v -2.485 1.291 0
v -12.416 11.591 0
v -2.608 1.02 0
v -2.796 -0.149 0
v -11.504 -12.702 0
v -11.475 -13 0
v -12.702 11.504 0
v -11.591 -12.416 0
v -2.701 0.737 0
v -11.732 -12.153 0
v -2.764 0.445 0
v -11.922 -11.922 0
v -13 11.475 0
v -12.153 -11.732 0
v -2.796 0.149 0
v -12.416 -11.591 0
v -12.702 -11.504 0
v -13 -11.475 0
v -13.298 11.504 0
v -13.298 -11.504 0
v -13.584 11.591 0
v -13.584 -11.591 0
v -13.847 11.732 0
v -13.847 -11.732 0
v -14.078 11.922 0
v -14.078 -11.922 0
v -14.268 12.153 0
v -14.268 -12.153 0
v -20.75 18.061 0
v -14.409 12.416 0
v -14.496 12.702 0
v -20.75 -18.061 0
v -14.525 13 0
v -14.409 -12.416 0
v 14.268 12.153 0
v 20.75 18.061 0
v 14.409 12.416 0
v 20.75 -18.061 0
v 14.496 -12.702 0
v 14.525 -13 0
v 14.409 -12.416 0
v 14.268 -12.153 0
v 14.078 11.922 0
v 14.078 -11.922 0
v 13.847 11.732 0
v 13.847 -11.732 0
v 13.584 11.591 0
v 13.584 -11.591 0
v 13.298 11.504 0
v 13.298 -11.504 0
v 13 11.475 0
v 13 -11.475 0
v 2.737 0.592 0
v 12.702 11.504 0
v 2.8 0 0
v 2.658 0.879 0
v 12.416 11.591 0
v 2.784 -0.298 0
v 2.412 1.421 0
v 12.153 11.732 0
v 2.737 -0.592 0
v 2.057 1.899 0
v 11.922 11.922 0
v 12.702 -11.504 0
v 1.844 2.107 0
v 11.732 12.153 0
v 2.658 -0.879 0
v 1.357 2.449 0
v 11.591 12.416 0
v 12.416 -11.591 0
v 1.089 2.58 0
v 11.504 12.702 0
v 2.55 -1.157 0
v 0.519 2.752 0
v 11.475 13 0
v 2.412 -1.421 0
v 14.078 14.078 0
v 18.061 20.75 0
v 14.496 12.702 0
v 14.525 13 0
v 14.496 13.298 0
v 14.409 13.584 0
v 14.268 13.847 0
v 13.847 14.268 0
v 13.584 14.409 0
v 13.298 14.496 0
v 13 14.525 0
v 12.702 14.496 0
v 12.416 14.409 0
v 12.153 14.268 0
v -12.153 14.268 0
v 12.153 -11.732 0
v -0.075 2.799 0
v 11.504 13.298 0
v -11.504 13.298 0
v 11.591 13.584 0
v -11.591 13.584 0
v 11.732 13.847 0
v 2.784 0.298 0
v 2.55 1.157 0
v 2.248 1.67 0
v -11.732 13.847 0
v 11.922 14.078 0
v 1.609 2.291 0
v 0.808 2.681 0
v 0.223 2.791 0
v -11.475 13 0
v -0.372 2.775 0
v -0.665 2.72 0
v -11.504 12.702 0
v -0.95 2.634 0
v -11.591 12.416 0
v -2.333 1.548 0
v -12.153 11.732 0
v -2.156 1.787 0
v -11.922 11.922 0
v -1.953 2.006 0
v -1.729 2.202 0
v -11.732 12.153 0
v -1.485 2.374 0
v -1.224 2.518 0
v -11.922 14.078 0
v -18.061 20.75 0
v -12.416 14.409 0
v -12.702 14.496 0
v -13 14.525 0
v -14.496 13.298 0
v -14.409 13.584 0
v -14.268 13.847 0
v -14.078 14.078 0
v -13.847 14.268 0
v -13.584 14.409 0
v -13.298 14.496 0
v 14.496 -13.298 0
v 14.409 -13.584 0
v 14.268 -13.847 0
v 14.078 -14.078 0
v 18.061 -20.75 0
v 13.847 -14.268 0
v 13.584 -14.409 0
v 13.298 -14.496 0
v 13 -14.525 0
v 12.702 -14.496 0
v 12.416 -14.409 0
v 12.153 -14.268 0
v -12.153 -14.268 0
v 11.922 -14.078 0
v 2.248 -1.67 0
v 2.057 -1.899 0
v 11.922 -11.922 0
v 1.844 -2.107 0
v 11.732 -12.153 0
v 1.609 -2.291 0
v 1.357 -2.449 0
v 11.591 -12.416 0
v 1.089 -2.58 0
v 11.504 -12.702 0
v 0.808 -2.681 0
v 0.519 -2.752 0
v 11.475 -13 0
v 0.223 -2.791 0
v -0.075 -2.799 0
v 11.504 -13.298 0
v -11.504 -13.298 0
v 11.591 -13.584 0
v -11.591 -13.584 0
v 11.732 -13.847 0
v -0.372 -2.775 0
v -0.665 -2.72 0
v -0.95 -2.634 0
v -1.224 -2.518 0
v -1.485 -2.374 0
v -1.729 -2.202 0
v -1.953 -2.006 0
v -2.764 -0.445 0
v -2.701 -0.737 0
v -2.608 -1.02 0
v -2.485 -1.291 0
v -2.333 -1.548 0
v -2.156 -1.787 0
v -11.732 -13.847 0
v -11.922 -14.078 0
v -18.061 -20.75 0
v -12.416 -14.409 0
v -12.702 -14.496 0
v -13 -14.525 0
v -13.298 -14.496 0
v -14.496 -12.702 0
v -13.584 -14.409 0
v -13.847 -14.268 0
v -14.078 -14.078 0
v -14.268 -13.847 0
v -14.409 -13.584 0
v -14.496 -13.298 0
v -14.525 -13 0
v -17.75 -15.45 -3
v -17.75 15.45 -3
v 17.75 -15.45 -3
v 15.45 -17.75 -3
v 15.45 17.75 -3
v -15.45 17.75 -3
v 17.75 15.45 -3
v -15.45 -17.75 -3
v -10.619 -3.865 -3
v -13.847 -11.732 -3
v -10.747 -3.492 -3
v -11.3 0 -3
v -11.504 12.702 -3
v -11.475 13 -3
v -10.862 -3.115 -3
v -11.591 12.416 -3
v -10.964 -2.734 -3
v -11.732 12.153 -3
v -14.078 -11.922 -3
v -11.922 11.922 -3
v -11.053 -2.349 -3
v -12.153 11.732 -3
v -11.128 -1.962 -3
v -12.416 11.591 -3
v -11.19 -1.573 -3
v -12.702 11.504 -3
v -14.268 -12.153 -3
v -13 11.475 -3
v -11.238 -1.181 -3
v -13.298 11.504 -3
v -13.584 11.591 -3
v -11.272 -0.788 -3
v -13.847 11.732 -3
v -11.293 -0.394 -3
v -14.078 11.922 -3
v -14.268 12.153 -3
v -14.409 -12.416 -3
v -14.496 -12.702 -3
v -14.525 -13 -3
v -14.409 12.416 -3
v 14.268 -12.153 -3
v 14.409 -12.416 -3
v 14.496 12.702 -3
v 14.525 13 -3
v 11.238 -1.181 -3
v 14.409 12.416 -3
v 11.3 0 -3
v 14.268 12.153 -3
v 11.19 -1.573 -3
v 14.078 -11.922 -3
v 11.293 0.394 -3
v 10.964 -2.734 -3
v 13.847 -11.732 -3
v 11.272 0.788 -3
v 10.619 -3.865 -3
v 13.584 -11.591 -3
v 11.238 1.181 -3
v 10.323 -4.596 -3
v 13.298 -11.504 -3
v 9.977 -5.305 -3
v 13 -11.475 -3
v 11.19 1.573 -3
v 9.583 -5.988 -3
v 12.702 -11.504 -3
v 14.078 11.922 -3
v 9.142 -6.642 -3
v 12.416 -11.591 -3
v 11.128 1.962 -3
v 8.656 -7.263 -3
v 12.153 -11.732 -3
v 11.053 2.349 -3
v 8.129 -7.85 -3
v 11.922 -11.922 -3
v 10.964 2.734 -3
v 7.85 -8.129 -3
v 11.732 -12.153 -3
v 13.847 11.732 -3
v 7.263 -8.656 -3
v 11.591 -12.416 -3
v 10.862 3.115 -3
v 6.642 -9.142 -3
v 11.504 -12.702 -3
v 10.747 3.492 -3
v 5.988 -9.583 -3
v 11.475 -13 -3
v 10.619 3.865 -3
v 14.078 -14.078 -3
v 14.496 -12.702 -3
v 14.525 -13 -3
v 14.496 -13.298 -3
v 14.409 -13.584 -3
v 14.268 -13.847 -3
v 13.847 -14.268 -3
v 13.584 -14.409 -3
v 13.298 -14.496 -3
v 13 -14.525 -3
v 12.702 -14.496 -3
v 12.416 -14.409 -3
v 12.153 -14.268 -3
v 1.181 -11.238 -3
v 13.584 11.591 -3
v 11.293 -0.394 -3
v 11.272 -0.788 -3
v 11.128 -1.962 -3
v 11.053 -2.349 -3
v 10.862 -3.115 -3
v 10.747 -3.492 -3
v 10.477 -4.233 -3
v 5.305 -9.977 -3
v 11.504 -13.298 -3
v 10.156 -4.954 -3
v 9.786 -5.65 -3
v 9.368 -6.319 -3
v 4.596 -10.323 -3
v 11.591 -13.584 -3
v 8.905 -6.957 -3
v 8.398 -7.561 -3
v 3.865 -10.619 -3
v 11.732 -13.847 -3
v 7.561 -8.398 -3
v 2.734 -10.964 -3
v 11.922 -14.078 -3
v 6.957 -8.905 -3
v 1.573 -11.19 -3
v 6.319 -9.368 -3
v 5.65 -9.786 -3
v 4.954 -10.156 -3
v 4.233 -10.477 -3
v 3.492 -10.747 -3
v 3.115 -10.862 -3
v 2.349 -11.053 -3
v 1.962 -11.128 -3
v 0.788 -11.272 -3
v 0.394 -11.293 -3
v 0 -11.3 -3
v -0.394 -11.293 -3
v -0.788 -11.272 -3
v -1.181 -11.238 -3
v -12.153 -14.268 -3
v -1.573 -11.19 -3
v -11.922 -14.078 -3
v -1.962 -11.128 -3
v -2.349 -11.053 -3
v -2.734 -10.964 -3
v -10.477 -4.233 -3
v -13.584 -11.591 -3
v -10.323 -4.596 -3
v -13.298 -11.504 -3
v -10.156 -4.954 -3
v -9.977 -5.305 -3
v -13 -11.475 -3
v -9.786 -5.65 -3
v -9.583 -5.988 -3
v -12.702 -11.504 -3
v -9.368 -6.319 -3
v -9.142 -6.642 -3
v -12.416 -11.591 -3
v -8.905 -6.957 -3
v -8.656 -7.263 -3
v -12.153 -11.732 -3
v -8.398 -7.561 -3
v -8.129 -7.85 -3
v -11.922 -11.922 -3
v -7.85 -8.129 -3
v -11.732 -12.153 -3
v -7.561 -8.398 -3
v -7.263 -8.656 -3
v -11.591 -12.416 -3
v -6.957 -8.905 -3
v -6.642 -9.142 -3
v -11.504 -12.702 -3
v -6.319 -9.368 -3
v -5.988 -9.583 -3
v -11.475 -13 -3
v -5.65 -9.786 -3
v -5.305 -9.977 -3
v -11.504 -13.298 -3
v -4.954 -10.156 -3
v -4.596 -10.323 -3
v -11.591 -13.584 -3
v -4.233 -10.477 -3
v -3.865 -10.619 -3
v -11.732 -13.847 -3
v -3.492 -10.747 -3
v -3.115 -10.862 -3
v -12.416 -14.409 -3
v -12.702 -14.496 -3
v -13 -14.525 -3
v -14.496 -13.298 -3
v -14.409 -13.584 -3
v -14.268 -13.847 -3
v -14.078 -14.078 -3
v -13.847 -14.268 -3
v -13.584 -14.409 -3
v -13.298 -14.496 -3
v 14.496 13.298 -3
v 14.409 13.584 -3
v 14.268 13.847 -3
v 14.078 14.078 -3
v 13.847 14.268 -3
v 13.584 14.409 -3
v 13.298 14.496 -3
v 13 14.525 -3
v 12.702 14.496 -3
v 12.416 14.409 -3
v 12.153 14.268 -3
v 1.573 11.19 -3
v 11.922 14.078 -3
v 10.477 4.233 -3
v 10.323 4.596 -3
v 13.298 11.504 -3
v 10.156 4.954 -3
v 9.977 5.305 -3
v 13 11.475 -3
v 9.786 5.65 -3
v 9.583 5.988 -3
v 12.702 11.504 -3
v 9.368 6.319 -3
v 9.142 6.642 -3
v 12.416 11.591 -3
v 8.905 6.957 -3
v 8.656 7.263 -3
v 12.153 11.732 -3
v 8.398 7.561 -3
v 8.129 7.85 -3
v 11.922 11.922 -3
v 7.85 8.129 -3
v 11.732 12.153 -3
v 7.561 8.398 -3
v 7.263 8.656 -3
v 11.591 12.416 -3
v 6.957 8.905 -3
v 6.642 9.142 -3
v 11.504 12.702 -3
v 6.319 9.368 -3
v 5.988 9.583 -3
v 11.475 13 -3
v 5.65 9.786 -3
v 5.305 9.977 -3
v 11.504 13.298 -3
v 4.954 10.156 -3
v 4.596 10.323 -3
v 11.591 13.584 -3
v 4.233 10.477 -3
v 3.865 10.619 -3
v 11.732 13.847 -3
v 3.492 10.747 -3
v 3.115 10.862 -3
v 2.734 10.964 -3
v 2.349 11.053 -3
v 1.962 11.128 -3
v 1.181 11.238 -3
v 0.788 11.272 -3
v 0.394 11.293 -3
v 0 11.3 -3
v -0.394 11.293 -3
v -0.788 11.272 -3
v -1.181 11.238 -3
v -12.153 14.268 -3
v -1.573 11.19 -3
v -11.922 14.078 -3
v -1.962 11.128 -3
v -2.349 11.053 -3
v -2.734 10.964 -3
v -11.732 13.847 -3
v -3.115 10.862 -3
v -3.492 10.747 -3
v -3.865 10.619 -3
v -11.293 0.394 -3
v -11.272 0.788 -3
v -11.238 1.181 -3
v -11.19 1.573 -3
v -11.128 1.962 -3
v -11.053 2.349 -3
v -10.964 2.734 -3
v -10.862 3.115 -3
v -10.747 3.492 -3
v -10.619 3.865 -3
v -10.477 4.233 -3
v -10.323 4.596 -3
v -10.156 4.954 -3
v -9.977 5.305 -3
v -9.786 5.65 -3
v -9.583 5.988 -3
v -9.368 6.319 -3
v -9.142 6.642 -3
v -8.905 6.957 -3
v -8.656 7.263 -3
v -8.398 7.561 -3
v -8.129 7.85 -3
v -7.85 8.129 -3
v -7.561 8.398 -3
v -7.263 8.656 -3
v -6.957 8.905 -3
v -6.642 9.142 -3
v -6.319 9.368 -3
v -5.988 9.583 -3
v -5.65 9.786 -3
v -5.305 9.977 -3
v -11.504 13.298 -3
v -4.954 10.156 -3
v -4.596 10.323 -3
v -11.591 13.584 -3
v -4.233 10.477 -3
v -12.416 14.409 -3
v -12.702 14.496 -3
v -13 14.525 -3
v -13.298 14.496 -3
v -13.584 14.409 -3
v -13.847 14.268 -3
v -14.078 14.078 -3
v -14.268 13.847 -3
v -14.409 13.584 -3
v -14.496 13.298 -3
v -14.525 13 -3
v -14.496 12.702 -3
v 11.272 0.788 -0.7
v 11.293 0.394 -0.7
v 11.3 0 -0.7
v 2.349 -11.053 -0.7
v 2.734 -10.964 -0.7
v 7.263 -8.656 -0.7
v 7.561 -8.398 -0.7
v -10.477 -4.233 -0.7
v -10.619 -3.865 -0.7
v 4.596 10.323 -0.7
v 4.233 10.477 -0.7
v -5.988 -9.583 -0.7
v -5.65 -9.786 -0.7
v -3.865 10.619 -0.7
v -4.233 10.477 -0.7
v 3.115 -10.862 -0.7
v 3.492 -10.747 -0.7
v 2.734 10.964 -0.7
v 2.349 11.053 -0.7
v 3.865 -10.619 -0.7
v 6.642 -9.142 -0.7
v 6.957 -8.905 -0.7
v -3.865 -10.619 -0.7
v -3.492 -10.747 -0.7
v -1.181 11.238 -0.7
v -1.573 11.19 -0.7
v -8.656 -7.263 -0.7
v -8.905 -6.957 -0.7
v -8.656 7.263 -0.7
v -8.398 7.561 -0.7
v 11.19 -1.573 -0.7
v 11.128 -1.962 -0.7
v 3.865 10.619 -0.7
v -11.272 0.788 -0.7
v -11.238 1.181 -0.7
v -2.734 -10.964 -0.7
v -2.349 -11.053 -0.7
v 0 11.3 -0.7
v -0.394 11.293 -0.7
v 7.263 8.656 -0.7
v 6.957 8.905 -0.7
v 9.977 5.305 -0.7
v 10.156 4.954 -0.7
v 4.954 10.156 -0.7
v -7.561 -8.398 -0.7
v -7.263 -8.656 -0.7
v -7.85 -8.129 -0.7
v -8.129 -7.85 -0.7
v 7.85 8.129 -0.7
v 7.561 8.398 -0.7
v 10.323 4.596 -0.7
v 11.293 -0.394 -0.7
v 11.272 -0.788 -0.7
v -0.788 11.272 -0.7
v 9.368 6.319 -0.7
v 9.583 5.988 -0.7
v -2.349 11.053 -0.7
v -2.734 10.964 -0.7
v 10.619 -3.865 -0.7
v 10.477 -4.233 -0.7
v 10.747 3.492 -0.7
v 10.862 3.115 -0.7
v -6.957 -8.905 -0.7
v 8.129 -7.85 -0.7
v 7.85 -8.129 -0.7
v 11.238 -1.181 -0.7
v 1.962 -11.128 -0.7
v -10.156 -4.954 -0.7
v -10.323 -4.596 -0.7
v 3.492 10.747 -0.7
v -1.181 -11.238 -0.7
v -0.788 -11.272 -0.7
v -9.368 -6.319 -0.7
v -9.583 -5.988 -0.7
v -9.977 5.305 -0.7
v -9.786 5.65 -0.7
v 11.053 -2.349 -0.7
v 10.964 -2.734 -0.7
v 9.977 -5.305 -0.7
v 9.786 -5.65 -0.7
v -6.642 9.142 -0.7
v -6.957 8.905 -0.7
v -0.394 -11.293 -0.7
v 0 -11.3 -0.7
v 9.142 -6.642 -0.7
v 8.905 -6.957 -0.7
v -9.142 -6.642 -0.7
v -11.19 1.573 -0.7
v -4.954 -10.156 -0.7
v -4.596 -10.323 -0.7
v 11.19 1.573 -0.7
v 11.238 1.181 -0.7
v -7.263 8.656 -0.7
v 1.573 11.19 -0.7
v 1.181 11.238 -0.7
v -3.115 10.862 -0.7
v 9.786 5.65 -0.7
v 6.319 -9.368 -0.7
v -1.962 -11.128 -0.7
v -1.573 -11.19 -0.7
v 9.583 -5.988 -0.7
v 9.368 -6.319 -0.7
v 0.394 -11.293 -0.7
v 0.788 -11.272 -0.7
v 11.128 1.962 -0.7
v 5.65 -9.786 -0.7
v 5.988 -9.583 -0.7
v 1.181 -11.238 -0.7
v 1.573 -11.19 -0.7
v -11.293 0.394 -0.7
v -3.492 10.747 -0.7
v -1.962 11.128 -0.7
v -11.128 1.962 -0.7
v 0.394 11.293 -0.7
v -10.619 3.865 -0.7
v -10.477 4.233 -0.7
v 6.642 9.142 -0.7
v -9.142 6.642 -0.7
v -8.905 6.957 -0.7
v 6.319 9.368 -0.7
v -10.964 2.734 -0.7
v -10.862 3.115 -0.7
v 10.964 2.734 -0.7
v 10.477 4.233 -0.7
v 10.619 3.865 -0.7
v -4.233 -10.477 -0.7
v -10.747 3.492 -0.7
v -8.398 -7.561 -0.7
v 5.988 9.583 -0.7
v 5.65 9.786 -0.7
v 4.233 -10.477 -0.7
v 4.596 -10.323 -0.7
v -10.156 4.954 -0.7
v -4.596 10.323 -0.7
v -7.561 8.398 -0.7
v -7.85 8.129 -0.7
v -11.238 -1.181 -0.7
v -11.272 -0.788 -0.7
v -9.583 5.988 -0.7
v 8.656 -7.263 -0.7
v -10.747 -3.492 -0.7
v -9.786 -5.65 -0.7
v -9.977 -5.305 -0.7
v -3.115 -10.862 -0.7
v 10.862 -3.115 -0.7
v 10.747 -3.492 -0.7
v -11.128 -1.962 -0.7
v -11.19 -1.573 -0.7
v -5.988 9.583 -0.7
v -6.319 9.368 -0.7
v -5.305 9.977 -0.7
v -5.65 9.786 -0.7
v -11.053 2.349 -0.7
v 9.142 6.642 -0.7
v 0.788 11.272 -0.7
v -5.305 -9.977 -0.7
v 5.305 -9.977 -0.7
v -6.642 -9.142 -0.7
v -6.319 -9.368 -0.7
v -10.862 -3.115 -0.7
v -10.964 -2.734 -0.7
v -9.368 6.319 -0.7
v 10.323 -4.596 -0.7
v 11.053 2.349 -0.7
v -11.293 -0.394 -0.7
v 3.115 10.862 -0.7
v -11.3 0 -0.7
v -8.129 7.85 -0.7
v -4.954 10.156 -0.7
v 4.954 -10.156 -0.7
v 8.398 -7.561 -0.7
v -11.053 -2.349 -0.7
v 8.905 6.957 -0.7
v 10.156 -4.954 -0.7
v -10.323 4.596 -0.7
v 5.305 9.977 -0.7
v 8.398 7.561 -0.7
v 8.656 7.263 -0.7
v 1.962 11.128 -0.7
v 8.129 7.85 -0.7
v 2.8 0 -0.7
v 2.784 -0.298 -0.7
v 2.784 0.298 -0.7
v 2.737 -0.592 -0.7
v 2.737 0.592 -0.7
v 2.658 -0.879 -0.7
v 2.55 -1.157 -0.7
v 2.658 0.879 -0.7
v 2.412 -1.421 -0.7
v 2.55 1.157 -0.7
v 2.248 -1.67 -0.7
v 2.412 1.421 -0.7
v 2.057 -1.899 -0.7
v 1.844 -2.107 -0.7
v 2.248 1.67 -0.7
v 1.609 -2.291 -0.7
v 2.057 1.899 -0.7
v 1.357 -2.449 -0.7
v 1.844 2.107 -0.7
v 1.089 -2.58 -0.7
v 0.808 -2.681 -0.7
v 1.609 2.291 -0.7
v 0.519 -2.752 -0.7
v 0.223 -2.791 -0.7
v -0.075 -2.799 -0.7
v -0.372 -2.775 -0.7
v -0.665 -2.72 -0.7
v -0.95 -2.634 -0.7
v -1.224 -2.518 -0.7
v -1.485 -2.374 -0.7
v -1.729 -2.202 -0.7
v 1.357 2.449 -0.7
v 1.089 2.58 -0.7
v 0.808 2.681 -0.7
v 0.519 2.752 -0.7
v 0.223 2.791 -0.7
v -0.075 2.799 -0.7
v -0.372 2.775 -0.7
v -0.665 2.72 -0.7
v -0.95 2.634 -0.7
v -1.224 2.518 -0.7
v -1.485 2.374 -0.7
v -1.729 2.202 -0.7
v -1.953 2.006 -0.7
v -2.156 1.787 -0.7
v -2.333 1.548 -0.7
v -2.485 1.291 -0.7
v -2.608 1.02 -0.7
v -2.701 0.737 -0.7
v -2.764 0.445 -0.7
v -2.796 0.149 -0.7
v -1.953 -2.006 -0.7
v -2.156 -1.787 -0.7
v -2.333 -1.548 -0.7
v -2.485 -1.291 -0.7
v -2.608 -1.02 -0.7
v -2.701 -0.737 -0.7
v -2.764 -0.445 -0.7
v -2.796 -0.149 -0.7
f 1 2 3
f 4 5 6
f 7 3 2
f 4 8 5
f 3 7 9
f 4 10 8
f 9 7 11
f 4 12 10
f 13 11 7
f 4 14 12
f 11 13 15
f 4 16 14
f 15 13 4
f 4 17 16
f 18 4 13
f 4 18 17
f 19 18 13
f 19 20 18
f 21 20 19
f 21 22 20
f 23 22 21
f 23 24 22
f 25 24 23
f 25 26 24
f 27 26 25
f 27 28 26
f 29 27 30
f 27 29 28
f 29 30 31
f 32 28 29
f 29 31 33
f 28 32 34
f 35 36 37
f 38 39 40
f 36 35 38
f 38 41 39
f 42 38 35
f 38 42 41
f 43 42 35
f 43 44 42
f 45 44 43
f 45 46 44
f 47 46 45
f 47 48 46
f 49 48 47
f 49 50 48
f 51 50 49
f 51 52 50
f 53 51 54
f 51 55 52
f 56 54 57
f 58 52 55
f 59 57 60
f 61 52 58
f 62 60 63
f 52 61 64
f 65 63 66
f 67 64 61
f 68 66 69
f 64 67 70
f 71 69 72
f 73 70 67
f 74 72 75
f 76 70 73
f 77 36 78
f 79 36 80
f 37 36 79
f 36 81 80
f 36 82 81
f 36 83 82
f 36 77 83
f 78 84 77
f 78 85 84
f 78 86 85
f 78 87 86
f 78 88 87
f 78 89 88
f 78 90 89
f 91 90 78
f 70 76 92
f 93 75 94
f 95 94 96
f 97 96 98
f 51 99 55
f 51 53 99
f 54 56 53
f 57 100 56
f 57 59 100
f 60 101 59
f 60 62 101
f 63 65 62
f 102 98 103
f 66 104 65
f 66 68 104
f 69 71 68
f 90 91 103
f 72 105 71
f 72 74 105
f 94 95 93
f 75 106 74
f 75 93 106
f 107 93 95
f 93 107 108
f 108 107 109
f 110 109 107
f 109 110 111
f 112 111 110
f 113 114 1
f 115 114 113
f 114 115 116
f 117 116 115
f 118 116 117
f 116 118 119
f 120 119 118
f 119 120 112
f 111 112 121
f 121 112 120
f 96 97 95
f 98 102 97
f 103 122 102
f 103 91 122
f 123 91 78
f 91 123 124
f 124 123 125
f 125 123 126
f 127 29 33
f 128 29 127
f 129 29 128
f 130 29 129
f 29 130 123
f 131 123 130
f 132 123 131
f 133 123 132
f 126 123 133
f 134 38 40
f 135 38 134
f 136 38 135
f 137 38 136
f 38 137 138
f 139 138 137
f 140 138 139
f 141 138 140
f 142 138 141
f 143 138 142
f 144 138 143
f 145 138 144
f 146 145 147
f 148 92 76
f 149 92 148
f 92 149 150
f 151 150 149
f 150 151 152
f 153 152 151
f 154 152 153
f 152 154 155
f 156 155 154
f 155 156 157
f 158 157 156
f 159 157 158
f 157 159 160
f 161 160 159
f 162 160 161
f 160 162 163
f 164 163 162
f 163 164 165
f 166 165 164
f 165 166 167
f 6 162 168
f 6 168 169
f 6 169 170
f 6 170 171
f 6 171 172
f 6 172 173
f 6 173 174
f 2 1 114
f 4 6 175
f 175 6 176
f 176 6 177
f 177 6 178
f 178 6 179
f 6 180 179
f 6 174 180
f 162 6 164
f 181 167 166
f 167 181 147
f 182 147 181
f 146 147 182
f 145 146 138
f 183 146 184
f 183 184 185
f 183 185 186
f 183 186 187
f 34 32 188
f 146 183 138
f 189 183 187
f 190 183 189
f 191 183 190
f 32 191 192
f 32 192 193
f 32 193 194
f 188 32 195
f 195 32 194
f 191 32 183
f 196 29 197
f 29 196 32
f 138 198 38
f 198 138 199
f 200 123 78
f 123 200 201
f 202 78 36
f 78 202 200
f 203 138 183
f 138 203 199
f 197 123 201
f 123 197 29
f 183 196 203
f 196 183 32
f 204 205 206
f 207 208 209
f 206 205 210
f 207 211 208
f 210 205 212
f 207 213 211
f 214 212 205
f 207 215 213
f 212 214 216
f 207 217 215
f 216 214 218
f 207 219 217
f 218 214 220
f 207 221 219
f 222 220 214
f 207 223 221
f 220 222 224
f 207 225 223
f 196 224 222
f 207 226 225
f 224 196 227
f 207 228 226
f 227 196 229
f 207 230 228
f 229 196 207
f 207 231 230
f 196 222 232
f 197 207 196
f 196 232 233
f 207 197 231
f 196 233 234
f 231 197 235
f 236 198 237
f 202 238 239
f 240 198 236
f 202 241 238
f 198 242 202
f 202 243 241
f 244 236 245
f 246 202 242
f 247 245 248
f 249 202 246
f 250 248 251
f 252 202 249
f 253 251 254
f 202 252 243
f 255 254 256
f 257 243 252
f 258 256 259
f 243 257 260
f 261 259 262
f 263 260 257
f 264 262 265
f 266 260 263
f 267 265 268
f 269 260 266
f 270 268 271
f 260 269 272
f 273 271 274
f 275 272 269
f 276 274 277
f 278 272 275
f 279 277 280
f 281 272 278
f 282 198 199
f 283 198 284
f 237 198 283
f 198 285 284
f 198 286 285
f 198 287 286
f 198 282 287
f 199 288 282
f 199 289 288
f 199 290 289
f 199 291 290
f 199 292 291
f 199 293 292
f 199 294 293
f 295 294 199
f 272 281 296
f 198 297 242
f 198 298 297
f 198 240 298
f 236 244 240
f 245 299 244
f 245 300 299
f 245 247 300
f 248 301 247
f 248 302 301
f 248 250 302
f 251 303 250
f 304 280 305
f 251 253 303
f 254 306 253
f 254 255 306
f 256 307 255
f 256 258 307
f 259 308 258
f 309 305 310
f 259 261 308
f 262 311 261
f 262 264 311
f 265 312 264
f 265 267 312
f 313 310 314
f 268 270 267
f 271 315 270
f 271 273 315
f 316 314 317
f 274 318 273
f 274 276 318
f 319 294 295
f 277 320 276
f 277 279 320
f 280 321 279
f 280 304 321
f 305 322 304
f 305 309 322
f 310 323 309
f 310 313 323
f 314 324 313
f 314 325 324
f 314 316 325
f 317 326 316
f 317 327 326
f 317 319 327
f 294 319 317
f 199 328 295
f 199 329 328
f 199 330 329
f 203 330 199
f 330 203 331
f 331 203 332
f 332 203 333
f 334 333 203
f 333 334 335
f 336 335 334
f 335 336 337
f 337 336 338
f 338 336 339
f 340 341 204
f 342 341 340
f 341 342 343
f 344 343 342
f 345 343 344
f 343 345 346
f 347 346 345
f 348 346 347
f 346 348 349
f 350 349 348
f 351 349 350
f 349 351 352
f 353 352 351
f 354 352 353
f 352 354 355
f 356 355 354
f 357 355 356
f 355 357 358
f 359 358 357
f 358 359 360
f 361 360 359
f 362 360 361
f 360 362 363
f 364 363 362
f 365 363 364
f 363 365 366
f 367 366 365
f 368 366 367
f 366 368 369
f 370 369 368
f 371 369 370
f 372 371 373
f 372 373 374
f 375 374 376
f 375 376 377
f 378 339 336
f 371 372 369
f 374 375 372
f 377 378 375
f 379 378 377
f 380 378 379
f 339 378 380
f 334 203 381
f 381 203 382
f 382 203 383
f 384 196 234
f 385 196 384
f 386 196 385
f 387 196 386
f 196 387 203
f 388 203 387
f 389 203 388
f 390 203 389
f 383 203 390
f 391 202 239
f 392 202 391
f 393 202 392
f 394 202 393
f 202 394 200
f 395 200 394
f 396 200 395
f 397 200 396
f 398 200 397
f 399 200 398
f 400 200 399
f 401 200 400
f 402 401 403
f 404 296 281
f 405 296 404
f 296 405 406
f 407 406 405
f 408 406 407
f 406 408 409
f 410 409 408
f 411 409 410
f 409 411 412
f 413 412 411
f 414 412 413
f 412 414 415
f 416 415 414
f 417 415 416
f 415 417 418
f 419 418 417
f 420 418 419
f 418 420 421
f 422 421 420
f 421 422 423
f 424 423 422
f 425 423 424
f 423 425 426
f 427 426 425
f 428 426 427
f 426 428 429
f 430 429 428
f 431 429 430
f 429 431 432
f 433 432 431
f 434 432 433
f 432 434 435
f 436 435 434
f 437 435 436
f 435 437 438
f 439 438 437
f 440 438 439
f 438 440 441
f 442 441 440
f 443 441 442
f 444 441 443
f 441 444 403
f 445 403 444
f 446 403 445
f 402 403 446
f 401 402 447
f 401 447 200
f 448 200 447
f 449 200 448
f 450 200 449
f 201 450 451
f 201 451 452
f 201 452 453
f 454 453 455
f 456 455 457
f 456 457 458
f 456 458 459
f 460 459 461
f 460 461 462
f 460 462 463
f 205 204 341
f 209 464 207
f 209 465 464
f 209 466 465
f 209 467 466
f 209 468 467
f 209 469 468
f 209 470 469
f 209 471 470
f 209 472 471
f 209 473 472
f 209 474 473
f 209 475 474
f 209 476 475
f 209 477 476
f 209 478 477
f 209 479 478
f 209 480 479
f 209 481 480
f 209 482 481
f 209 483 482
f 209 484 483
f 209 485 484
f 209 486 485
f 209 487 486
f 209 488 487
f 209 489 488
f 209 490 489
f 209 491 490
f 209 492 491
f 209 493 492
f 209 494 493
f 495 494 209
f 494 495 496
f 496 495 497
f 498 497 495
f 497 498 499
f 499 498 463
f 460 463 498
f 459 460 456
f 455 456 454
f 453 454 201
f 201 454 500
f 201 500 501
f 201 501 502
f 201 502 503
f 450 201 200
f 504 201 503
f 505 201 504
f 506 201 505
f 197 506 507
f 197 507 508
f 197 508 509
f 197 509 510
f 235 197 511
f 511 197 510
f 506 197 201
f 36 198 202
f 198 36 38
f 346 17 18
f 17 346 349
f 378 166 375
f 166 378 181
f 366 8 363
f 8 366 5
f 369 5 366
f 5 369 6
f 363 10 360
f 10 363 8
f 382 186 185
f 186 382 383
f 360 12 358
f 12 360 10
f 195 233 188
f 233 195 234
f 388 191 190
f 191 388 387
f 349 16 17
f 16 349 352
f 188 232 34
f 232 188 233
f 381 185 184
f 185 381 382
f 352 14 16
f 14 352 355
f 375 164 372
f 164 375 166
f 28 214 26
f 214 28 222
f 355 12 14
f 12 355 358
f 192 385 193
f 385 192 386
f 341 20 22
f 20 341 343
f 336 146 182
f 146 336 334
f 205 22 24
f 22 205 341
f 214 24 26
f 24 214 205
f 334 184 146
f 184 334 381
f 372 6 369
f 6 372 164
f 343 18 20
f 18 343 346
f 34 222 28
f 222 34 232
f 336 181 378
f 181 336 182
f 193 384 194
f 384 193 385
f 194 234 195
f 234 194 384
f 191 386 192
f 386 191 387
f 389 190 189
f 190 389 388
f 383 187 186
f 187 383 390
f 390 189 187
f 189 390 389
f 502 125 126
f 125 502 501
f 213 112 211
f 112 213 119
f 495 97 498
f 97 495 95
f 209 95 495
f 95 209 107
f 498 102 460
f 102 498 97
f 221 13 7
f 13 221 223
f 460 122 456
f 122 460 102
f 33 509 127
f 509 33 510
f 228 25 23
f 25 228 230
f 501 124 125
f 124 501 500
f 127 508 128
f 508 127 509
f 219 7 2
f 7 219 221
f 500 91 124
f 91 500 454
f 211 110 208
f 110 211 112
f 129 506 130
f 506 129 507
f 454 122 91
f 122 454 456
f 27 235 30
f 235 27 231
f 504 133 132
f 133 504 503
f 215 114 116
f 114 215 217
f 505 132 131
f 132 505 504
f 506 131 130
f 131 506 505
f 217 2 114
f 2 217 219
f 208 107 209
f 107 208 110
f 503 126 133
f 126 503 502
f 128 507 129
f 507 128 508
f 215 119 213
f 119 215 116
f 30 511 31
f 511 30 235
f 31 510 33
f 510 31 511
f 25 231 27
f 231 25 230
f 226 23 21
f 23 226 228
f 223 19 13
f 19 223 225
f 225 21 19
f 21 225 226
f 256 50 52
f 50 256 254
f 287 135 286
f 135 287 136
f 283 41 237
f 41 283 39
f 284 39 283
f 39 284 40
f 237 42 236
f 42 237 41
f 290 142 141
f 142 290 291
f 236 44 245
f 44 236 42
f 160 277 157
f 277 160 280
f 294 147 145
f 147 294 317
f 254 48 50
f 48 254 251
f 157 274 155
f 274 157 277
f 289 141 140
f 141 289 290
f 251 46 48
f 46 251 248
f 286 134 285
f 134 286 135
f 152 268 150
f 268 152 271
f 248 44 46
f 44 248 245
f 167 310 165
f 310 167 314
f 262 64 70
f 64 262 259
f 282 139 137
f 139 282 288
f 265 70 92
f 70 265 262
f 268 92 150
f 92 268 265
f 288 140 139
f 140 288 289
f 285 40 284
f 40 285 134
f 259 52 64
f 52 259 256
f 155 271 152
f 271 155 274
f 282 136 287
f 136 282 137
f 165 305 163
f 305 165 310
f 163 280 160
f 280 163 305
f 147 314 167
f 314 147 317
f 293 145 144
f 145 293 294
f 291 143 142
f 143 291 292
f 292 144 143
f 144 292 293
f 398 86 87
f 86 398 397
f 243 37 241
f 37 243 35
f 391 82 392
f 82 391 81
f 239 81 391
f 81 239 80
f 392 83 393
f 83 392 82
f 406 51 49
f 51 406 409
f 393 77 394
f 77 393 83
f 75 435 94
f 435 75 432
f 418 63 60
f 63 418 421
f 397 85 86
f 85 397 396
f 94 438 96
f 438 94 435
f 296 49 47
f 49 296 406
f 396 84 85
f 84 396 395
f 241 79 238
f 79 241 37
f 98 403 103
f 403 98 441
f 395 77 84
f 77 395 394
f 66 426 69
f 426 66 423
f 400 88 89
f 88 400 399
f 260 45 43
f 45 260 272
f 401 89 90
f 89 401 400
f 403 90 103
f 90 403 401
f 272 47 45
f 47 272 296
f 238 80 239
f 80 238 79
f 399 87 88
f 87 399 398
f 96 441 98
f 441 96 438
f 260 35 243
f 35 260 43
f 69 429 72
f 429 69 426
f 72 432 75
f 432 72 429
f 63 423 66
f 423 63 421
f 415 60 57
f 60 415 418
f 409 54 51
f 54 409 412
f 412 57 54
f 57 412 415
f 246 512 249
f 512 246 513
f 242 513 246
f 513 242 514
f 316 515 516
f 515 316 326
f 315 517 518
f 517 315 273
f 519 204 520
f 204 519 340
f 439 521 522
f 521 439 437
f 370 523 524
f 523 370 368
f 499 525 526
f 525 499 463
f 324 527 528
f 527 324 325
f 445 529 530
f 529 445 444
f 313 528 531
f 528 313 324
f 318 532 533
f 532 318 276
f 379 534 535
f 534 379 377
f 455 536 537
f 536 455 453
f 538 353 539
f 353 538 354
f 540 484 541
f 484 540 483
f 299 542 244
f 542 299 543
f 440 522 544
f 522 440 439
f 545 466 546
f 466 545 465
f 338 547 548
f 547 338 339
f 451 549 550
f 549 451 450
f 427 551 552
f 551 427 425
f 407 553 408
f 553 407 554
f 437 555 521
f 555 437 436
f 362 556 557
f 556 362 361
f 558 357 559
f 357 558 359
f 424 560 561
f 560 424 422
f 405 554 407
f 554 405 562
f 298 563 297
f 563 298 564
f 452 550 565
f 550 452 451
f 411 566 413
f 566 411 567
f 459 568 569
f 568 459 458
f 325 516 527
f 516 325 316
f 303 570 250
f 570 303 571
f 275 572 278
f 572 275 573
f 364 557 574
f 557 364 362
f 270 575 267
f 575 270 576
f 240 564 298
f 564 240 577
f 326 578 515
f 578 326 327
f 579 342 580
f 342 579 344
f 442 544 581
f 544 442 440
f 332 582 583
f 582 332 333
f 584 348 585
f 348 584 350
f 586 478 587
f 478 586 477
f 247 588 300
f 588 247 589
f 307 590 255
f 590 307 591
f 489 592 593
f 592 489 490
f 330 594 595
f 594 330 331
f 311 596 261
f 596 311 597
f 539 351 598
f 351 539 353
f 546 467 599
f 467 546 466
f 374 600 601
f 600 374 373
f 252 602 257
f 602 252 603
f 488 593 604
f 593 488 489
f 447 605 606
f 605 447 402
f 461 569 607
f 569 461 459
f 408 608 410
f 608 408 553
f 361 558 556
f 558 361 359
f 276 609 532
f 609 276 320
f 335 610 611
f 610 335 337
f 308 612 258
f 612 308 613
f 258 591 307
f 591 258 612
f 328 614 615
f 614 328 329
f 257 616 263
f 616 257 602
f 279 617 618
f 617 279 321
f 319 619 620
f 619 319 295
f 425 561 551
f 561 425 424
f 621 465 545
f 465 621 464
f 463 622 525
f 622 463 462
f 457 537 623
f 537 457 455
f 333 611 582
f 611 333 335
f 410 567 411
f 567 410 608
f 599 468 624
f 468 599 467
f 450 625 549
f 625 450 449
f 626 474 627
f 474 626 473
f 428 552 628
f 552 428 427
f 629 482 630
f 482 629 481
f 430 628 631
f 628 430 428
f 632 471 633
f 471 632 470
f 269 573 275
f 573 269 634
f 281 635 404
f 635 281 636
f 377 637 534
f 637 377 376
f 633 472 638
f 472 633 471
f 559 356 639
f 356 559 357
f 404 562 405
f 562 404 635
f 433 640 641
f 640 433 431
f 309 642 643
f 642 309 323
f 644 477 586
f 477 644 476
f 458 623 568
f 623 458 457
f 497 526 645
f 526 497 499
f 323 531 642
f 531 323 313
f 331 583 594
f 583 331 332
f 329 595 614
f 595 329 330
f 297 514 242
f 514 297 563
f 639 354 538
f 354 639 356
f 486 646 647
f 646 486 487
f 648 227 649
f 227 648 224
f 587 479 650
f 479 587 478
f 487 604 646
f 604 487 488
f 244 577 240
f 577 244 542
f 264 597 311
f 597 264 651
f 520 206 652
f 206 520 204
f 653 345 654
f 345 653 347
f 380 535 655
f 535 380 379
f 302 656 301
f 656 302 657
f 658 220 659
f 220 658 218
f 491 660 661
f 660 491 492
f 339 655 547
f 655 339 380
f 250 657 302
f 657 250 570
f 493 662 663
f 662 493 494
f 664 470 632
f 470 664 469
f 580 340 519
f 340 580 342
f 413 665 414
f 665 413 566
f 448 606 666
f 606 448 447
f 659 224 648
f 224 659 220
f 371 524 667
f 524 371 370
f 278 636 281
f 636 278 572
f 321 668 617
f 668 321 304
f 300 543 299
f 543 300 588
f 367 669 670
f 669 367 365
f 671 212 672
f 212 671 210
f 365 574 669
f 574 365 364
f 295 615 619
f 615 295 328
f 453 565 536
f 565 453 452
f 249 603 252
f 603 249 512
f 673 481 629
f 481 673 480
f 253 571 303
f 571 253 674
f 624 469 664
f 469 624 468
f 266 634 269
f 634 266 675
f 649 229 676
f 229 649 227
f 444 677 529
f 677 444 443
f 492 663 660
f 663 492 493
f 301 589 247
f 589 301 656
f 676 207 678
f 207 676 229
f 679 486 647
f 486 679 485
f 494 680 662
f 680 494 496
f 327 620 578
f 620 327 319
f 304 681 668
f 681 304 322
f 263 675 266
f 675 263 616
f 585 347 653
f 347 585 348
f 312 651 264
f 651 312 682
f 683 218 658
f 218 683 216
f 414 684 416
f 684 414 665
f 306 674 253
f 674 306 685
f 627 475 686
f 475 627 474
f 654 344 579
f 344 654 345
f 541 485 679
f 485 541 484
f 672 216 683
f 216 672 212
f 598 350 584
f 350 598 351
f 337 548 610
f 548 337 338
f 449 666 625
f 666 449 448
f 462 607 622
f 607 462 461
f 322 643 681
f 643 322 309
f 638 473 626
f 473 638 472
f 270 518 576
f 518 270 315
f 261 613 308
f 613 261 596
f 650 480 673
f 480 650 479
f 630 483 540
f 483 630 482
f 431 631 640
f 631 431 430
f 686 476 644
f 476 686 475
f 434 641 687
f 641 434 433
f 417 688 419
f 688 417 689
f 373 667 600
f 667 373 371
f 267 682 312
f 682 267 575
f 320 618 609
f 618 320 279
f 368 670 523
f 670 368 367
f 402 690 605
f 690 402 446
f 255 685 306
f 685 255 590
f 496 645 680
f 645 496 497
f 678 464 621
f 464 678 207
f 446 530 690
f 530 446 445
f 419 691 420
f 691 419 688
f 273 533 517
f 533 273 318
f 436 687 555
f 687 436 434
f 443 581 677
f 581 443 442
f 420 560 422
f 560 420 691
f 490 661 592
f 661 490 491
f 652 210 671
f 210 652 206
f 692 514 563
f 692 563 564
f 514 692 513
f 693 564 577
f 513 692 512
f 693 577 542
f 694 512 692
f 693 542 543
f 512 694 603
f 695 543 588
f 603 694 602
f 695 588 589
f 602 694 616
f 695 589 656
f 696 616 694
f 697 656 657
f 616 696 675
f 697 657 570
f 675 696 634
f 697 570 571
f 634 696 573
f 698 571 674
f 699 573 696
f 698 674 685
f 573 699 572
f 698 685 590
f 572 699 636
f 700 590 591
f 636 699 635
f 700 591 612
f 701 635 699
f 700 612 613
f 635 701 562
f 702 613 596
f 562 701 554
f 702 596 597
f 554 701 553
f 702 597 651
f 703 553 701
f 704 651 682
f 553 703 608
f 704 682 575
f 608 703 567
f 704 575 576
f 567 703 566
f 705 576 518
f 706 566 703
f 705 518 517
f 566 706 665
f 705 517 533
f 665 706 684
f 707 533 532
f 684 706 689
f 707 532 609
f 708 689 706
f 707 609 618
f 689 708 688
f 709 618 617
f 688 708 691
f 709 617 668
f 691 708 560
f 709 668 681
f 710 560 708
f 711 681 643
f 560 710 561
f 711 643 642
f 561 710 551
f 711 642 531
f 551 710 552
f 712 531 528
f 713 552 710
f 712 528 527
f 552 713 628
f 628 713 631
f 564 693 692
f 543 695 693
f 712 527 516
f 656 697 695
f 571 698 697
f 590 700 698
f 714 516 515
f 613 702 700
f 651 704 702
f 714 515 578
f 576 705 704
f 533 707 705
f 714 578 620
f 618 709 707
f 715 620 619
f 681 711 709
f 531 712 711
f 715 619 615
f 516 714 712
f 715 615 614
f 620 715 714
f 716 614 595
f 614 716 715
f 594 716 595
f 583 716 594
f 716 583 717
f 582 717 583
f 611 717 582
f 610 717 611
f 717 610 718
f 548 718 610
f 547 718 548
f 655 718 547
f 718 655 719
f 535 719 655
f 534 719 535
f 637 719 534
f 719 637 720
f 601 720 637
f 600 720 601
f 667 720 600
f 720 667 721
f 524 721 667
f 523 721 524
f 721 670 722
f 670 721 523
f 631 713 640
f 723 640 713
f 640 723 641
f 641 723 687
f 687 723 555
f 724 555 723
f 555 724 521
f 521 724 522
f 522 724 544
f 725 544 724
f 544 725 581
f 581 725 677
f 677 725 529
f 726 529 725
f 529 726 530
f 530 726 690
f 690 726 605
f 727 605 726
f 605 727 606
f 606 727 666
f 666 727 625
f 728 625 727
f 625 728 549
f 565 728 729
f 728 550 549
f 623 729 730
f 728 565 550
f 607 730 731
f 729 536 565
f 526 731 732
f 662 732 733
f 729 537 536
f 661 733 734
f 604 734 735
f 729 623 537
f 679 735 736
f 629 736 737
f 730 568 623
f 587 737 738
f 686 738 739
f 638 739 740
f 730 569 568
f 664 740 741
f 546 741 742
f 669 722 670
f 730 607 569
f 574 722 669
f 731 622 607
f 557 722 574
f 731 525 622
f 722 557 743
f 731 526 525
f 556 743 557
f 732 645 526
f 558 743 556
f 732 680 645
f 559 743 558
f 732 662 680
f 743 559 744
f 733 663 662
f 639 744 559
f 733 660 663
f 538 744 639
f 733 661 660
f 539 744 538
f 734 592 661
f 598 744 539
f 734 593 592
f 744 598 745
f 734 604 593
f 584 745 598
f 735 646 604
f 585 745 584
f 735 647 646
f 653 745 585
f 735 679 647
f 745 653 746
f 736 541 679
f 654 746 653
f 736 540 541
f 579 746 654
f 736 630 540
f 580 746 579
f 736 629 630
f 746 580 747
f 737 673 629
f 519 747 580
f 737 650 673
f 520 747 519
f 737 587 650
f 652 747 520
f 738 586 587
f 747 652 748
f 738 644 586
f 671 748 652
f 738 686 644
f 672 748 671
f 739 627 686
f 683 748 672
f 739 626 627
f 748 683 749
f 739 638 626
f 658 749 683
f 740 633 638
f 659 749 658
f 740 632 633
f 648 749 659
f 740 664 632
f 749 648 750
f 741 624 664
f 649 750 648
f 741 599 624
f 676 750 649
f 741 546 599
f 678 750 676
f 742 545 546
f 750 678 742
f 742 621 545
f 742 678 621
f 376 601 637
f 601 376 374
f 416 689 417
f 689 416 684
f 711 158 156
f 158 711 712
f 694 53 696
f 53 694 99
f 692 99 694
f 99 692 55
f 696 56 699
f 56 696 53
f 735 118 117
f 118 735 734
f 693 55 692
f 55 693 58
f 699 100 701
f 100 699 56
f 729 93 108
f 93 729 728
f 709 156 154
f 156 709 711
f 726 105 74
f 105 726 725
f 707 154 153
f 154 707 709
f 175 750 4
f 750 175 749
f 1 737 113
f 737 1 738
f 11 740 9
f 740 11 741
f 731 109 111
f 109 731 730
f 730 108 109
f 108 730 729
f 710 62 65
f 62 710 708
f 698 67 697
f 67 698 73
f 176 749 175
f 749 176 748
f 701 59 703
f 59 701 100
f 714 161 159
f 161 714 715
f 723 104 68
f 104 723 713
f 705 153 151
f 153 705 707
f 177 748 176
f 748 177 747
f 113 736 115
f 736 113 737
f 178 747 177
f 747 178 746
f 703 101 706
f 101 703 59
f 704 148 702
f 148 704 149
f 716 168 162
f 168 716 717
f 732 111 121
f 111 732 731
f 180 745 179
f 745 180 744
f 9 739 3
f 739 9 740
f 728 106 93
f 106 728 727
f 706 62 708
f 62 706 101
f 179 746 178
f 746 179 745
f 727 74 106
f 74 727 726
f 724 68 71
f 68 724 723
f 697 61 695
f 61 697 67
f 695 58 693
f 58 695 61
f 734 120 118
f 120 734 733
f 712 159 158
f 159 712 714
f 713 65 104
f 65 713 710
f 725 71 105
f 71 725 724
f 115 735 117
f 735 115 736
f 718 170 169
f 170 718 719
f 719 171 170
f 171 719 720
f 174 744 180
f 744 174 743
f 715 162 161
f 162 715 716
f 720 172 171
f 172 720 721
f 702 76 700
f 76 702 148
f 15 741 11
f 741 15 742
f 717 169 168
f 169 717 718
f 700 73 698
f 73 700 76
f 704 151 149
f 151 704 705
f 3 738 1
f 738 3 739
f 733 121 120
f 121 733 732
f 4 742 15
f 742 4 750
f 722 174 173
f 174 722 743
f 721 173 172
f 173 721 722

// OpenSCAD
// file: dims.scad
Llow = 96;
Lup_low = 119;
Lup_top = 65;
Wbot=80; //72;
servoaxleL = Wbot/5*2;
hornW = .85*servoaxleL;
Dbot=30;
Lservo = 57;
wallT = 2;
rbot=wallT/2;
rcablebundle=6;
xcablebundle = Wbot/2 - rcablebundle - rbot - 5.5;
xconnection=-3; //-6.1;
mouthR = 11/2+wallT; //Dbot/4;
dedge = Wbot/2 - rbot - 3.5; //BOLT3LOOSE;

BEAMMAXANGLE=120;
mouthcablex = 13;
CLOSEBARD=3+.42*8;
CHINDIST=.2;
SERVOTURNANGLE = 120;

beamServoNtooth= 20;
mg215dims = [23, 26.5, 12, 6];	
LHORNTHREAD = 12;
hornarmL=Dbot/2 - 5.3;
xleg=10;

Wlegs = Wbot + 2;
Tlegs = Dbot/3*2;
Hlegs = 18;

// BOLTS:
BOLT5TIGHT=4.8;
BOLT5LOOSE=5.05;
BOLT3TIGHT=2.8;
BOLT3LOOSE=3.05;
BOLT25TIGHT = 2.30; // 2.35
BOLT25LOOSE = 2.60;
BOLT15TIGHT = 1.30; // 2.35
BOLT15LOOSE = 1.60;

// GEARS:
//GEART = 12; //6
GEARMODUL = 1.0; //1.0;
HELIXANGLE=20; // 30
PRESSUREANGLE=10; //25;

SERVOGEARNTOOTH = 15; // 15
SERVOHORNT = 7.0; //6
SERVOHORNBEARINGT = 4;

// Bore, Diam, Thickness
SERVOBEARINGDIMS = [5, 11, 4];
AXLEBEARINGDIMS = [10, 15, 4];
WHEELBEARINGDIMS = [20, 27, 4];

AXLEHORNDIN = AXLEBEARINGDIMS[0]/sqrt(2);

SERVOHORNSP = .96;
TIGHTSP = .05;
RADSP = .15; // .25
AXLECOVERT = 1.2;

THREADH=.6;
THREADPITCH = 2;



GEARCOLOR="Ivory"; //WhiteSmoke"; //SlateGray";
BEARINGCOLOR="Gray";
$fn = 0; //50000;


THREADSPACEPHI = 30; // Positive means you have to twist further to tighten by phi than theory.
SHOWALIGNERS = false; //true; 
CUTALIGNERS = false; // Cut wedges to gears to check match.
// file: usedims.scad
acc =  "print";  // "show"

$fa = acc=="print" ? 2 : 7; //1;
$fs = acc=="print" ? .3 : 1; //.2; //.02


mountT=22;
rcorner=2;

//BODY:
Rtop=11; //mountT;
Hframe=193;
Wbottom=100; //95; //  124;
alpha = 4.5; //4.5; // 7.5
Wtop = edgex(Hframe)*2; // Wbottom - 2*Hframe*tan(alpha); //Whead-2; // + 2*Rtop*tan(alpha);
//alpha = atan(((Wbottom-Wtop)/2)/(Hframe + Rtop));
Rbottom = rcorner;
Tframe=55;
Hthick = 30;

//HEAD:
//Whead=59; 
Hhead=115;
Lhead=42;
Hneck = .4;
Rhead=rcorner;
headaddW=0;
Zheadbottom=Hframe+Rtop+Hneck+Rhead; 
Wheadbottom=edgex(Zheadbottom)*2 + headaddW; 
Wheadtop=edgex(Zheadbottom+Hhead)*2 + headaddW; 
wallT=1.60;
headtheta=6.9;
headBottomT = Lhead - mountT;
headServoNteeth=15;
mountD=6;
dwall = 4;
headmountpolepos1=[for (z=[dwall]) [edgex(z, Wheadbottom) - dwall,z]];
sf = 6;
headmountpolepos2= concat(headmountpolepos1, [for (p=headmountpolepos1) [-p[0], p[1]]]); // [[Whead/2 - dwall, Hhead/2 - sf], [-Whead/2 + dwall, Hhead/2 + sf]]);
headmountpolepos= concat(headmountpolepos2, [for (z=[[-1, Hhead/2-4], [1, Hhead/2-4]]) [z[0]*edgex(z[1], Wheadbottom)-z[0]*dwall, z[1]]]); // [[Whead/2 - dwall, Hhead/2 - sf], [-Whead/2 + dwall, Hhead/2 + sf]]);



//
function edgex(h, W=Wbottom) = W/2 - h*tan(alpha);

framemountpolepos_l=[for (h=[-Rbottom+dwall,Hframe/2-12, Hframe-40, Hframe]) [edgex(h) - dwall, h]];
framemountpolepos_r=[for (p=framemountpolepos_l) [-p[0], p[1]]];
framemountpolepos_b=[for (i=[-1,1]) [i*18, -Rbottom + dwall]];
framemountpolepos = concat(framemountpolepos_l, framemountpolepos_r, framemountpolepos_b);

echo(framemountpolepos);

TIGHTSP = .05;
MEDIUMSP = .1;
//
// BOLTS:
BOLT5TIGHT=4.8;
BOLT5LOOSE=5.05;
BOLT3TIGHT=2.8;
BOLT3LOOSE=3.05;
BOLT25TIGHT = 2.30; // 2.35
BOLT25LOOSE = 2.60;
BOLT15TIGHT = 1.30; // 2.35
BOLT15LOOSE = 1.60;

AXLEBEARINGDIMS = [10, 15, 4];
AXLECOVERT = 1.2;
SERVOHORNSP = .96;
// file: utils.scad
include <dims.scad>;
include <usedims.scad>;

function pitchD(ntooth, modul=GEARMODUL) = ntooth*modul;
function getNTeeth(servoNtooth, targetTurnAngle, servoTrunAngle) = ceil(servoNtooth/targetTurnAngle*servoTrunAngle);
function gearD(ntooth, modul=GEARMODUL) = ntooth*modul + 2*modul;
module bolt(h, d, sink, baseL=5, key="csunk"){
   	
	// Expand the bolt sink hole by this amount: 
	sinkExpFac = 1.1;
	
	// Gray bolts
    	color("Gray")
    	translate([0,0,sink])
    	union(){
		// bolt thread
		translate([0,0,d/2]) cylinder(h=h, r=d/2);
		// bolt base
		if (key=="csunk"){cylinder(h=d/2, r1=d*sinkExpFac, r2=d/2*sinkExpFac);}
		else if (key=="flat"){cylinder(h=d/2 - .2, r=d*sinkExpFac);}
		
		translate([0,0,-baseL - sink]) cylinder(h=baseL + sink, r=d*sinkExpFac);
    	}
}


module thread(h, d, phi=0, threadH=THREADH, pitch=THREADPITCH, aligner="show", dtip1=0, dtip2=0, handness="right"){

	handmltp = handness == "right" ? -1 : 1;
	phi = -phi*handmltp;
	twistphi = handmltp*h/pitch*360;
	dtip1 = dtip1==0 ? d*4/5 : dtip1; // top
	dtip2 = dtip2==0 ? d*4/5 : dtip2; // bottom

	module thread_base(){
		difference(){
		rotate([0,0,twistphi/2])
		linear_extrude(height=h, twist=twistphi, center=true, slices=round(h/.15)) 
		translate([threadH/2,0]) 
		circle(d/2-threadH/2);
		if (htip(dtip1)>0){translate([0,0,h/2]) tipcutter(dtip1);}
		if (htip(dtip2)>0){translate([0,0,-h/2]) mirror([0,0,1]) tipcutter(dtip2);}
		}

	}
	
	tiptheta = 60;
	function htip(dtip) = (d - dtip)/2*tan(tiptheta);

	module tipcutter(dtip){
		htip_ = htip(dtip);
		translate([0,0,-htip_])
		difference(){
			cylinder(h=2*htip_, d=2*d);
			cylinder(h=htip_, d1=d, d2=dtip);
		}
	}
	
	rotate([0,0,phi]){
		if (aligner=="dontshow"){
			thread_base();
		}
		else if (aligner=="show"){	
			thread_base();
			translate([50,0,0])cube([100, 1, 1], center=true);
		}
		else if (aligner=="onlyaligner"){
			translate([50,0,0])cube([100, 1, 1], center=true);
		}
	
	}

}
module closebolts(key, positions, L, forceboltD=-1){
 
 boltD_ = key=="boltsup" ? BOLT3LOOSE :
         key == "boltsbot" ? BOLT3TIGHT : 0;
 
 boltD = forceboltD > 0 ? forceboltD : boltD_;

 key_ = key=="boltsup" || key=="boltsbot" ? "bolt" : key;
 for (pos=positions){
   x = pos[0];
   z = pos[1];
   translate([x,0,z]) 
   rotate([90,0,0])
   closebar(L=L, boltD=boltD, key=key_);
 }
}

module closebar(L, boltD=BOLT3LOOSE, key="mockup"){
  Ltop = L/2;
  Lbot = L/2 - .5;
  D = CLOSEBARD; 
  if (key=="barup"){
    cylinder(d=D, h = Ltop);
  }
  else if (key=="barbot"){
    translate([0,0,-L/2])
    cylinder(d=D, h = Lbot);
  }
  else if (key=="bolt"){
    mirror([0,0,1])
    translate([0,0,-L/2])
    bolt(L-3, d=boltD,sink=.5);
    mirror([0,0,1]) cylinder(h=.5, r=boltD);
  }
  
  //bolt(L-3, d=boltD,sink=.5);
}

module rounded_tilted_cylinder(L, R, r, alpha){
  
  assert(R>=r); 
  module end(){
    translate([0,0,L/2])
    rotate([0,alpha, 0])  
    translate([0,0,-r*cos(alpha)])
    scale([1/cos(alpha), 1, 1])
  
    rotate_extrude()
    union(){
      translate([0,-r]) square([R-r, 2*r]);  
      translate([R-r, 0]) 
      intersection(){
        circle(r);
        translate([0,-r]) square([r, 2*r]);
      }
      }

    }

    hull(){
    end();
    mirror([0,0,1]) end();
    }
}

module selector(ycut, side=-1){

  shifty = side==-1 ? 5000 : -5000; 
  
  difference(){
    children();
    translate([0,shifty + ycut, 0]) cube(10000, center=true);
  }
  
  
}

module mount_poles_bolts(positions, D=mountD, negy=-500, holeD=0){
  
  for (p=positions){
    translate([p[0], negy, p[1]])
    rotate([-90,0,0]) 
    if (holeD>0){
      difference(){
        bolt(1000, d=D, sink=.2);
        cylinder(h=2000, d=holeD);
      }
    }
    else {bolt(1000, d=D, sink=.2);}
  }
}



module roundedcube(size = [1, 1, 1], center = false, radius = 0.5, apply_to = "all") {
	// If single value, convert to [x, y, z] vector
	size = (size[0] == undef) ? [size, size, size] : size;

	translate_min = radius;
	translate_xmax = size[0] - radius;
	translate_ymax = size[1] - radius;
	translate_zmax = size[2] - radius;

	diameter = radius * 2;

	module build_point(type = "sphere", rotate = [0, 0, 0]) {
		if (type == "sphere") {
			sphere(r = radius);
		} else if (type == "cylinder") {
			rotate(a = rotate)
			cylinder(h = diameter, r = radius, center = true);
		}
	}

	obj_translate = (center == false) ?
		[0, 0, 0] : [
			-(size[0] / 2),
			-(size[1] / 2),
			-(size[2] / 2)
		];

	translate(v = obj_translate) {
		hull() {
			for (translate_x = [translate_min, translate_xmax]) {
				x_at = (translate_x == translate_min) ? "min" : "max";
				for (translate_y = [translate_min, translate_ymax]) {
					y_at = (translate_y == translate_min) ? "min" : "max";
					for (translate_z = [translate_min, translate_zmax]) {
						z_at = (translate_z == translate_min) ? "min" : "max";

						translate(v = [translate_x, translate_y, translate_z])
						if (
							(apply_to == "all") ||
							(apply_to == "xmin" && x_at == "min") || (apply_to == "xmax" && x_at == "max") ||
							(apply_to == "ymin" && y_at == "min") || (apply_to == "ymax" && y_at == "max") ||
							(apply_to == "zmin" && z_at == "min") || (apply_to == "zmax" && z_at == "max")
						) {
							build_point("sphere");
						} else {
							rotate = 
								(apply_to == "xmin" || apply_to == "xmax" || apply_to == "x") ? [0, 90, 0] : (
								(apply_to == "ymin" || apply_to == "ymax" || apply_to == "y") ? [90, 90, 0] :
								[0, 0, 0]
							);
							build_point("cylinder", rotate);
						}
					}
				}
			}
		}
	}
}


function slice(a, i1=0, i2=-1) =i2==-1 ? slice(a, i1, len(a)) : [for (i = [ 0 :1:len(a)-1]) if (i>=i1 && i<(i2+1)) a[i]];


function sum_slice(a, i1=0, i2=-1) = sum(slice(a, i1, i2));

function sum(a, i=0, r=0) = i < len(a) ? sum(a, i+1, r+a[i]) : r;

function cumsum(a) = [for (i=[0:1:len(a)-1]) sum_slice(a, 0, i)];


module rounded_cutter(L, W, T, r){
  assert(min(W,T)>2*r);

  linear_extrude(height=L, center=true)
  offset(r)
  square([W-2*r, T-2*r],center=true);

}
// main file
use <utils.scad>;
include <usedims.scad>;
// NEMA
nema_spacing = .3;
nema14_x = 35.2 + nema_spacing;
nema14_y = 35.2 + nema_spacing;
nema14_z = 23.0 + nema_spacing;
corner_cut = 2  + nema_spacing;
nema_L_axle = 17;
nema_r_axle = 5/2  + nema_spacing;
nema_bolt_d = BOLT3LOOSE;
nema_L_bolt = 5;

middle_cyl_r = 11  + nema_spacing;
middle_cyl_h = 2  + nema_spacing;


build = 0;

module nema14(){
    module corner(){
        linear_extrude(height = nema14_z) polygon(points = [[0,0],[nema14_x/2, 0], [nema14_x/2, nema14_y/2 - corner_cut], [nema14_x/2-corner_cut, nema14_y/2], [0, nema14_y/2]]);
    }
    
    color("grey"){
    union() {
        corner();
        mirror([1,0,0]) corner();
        mirror([1,1,0]) corner();
        mirror([0,1,0]) corner();
    }
    
    // TOP RING
    cylinder(r = middle_cyl_r, h = nema14_z +  middle_cyl_h);
    // AXLE
    cylinder(r = nema_r_axle, h = nema14_z +  nema_L_axle);
    }
}


bolt_dist = 26/2;
module nema_bolts(L, r, mountT=3){
    
    for (i=[-1,1]){
        for (j=[-1,1]){
            translate([i*bolt_dist, j*bolt_dist, nema14_z + mountT]) mirror([0,0,1])  bolt(L + nema14_z, 2*r, 0);
        }
    }
}

module nema14_mount(t){
    
    module base_plate(){
        s_ = 2*t/nema14_x + 1;
        translate([0,0,t])
        intersection(){
        translate([0,0, -1000/2])cube(1000, center = true);
        hull(){
            translate([0,0,-t])
            intersection(){
                translate([0,0, t-1000/2])cube(1000, center = true);
                nema14();
            }
            
            scale([s_,s_,1])intersection(){
                translate([0,0, t-1000/2])cube(1000, center = true);
                nema14();
            }
        }
        }
    }
    
    translate([0,0,nema14_z])
    difference(){
        base_plate();
        translate([0,0,-1]) nema_bolts(nema_L_bolt+1, BOLT3LOOSE/2);
        translate([0,0,-1]) cylinder(r = middle_cyl_r, h = middle_cyl_h+1);
        translate([0,0,-1]) cylinder(r = nema_r_axle, h = nema14_z +  nema_L_axle);
    }
    
    //nema_bolts(nema_L_bolt+1, BOLT3LOOSE/2, mountT=t);
    
}


module nema14_mountz0(T){translate([0,0,-nema14_z-T]) nema14_mount(T);}
module nema14_z0(T){translate([0,0,-nema14_z-T]) nema14();}
module nema14_boltsz0(L, D=BOLT3LOOSE, T=3){translate([0,0,-nema14_z-T]) nema_bolts(L, D/2, T);}
//nema14();
//L_bolt = 5;
//r_bolt = 3/2;
//nema_bolts(10, BOLT3LOOSE/2);
//nema14_z0();
nema14_mountz0(3);
